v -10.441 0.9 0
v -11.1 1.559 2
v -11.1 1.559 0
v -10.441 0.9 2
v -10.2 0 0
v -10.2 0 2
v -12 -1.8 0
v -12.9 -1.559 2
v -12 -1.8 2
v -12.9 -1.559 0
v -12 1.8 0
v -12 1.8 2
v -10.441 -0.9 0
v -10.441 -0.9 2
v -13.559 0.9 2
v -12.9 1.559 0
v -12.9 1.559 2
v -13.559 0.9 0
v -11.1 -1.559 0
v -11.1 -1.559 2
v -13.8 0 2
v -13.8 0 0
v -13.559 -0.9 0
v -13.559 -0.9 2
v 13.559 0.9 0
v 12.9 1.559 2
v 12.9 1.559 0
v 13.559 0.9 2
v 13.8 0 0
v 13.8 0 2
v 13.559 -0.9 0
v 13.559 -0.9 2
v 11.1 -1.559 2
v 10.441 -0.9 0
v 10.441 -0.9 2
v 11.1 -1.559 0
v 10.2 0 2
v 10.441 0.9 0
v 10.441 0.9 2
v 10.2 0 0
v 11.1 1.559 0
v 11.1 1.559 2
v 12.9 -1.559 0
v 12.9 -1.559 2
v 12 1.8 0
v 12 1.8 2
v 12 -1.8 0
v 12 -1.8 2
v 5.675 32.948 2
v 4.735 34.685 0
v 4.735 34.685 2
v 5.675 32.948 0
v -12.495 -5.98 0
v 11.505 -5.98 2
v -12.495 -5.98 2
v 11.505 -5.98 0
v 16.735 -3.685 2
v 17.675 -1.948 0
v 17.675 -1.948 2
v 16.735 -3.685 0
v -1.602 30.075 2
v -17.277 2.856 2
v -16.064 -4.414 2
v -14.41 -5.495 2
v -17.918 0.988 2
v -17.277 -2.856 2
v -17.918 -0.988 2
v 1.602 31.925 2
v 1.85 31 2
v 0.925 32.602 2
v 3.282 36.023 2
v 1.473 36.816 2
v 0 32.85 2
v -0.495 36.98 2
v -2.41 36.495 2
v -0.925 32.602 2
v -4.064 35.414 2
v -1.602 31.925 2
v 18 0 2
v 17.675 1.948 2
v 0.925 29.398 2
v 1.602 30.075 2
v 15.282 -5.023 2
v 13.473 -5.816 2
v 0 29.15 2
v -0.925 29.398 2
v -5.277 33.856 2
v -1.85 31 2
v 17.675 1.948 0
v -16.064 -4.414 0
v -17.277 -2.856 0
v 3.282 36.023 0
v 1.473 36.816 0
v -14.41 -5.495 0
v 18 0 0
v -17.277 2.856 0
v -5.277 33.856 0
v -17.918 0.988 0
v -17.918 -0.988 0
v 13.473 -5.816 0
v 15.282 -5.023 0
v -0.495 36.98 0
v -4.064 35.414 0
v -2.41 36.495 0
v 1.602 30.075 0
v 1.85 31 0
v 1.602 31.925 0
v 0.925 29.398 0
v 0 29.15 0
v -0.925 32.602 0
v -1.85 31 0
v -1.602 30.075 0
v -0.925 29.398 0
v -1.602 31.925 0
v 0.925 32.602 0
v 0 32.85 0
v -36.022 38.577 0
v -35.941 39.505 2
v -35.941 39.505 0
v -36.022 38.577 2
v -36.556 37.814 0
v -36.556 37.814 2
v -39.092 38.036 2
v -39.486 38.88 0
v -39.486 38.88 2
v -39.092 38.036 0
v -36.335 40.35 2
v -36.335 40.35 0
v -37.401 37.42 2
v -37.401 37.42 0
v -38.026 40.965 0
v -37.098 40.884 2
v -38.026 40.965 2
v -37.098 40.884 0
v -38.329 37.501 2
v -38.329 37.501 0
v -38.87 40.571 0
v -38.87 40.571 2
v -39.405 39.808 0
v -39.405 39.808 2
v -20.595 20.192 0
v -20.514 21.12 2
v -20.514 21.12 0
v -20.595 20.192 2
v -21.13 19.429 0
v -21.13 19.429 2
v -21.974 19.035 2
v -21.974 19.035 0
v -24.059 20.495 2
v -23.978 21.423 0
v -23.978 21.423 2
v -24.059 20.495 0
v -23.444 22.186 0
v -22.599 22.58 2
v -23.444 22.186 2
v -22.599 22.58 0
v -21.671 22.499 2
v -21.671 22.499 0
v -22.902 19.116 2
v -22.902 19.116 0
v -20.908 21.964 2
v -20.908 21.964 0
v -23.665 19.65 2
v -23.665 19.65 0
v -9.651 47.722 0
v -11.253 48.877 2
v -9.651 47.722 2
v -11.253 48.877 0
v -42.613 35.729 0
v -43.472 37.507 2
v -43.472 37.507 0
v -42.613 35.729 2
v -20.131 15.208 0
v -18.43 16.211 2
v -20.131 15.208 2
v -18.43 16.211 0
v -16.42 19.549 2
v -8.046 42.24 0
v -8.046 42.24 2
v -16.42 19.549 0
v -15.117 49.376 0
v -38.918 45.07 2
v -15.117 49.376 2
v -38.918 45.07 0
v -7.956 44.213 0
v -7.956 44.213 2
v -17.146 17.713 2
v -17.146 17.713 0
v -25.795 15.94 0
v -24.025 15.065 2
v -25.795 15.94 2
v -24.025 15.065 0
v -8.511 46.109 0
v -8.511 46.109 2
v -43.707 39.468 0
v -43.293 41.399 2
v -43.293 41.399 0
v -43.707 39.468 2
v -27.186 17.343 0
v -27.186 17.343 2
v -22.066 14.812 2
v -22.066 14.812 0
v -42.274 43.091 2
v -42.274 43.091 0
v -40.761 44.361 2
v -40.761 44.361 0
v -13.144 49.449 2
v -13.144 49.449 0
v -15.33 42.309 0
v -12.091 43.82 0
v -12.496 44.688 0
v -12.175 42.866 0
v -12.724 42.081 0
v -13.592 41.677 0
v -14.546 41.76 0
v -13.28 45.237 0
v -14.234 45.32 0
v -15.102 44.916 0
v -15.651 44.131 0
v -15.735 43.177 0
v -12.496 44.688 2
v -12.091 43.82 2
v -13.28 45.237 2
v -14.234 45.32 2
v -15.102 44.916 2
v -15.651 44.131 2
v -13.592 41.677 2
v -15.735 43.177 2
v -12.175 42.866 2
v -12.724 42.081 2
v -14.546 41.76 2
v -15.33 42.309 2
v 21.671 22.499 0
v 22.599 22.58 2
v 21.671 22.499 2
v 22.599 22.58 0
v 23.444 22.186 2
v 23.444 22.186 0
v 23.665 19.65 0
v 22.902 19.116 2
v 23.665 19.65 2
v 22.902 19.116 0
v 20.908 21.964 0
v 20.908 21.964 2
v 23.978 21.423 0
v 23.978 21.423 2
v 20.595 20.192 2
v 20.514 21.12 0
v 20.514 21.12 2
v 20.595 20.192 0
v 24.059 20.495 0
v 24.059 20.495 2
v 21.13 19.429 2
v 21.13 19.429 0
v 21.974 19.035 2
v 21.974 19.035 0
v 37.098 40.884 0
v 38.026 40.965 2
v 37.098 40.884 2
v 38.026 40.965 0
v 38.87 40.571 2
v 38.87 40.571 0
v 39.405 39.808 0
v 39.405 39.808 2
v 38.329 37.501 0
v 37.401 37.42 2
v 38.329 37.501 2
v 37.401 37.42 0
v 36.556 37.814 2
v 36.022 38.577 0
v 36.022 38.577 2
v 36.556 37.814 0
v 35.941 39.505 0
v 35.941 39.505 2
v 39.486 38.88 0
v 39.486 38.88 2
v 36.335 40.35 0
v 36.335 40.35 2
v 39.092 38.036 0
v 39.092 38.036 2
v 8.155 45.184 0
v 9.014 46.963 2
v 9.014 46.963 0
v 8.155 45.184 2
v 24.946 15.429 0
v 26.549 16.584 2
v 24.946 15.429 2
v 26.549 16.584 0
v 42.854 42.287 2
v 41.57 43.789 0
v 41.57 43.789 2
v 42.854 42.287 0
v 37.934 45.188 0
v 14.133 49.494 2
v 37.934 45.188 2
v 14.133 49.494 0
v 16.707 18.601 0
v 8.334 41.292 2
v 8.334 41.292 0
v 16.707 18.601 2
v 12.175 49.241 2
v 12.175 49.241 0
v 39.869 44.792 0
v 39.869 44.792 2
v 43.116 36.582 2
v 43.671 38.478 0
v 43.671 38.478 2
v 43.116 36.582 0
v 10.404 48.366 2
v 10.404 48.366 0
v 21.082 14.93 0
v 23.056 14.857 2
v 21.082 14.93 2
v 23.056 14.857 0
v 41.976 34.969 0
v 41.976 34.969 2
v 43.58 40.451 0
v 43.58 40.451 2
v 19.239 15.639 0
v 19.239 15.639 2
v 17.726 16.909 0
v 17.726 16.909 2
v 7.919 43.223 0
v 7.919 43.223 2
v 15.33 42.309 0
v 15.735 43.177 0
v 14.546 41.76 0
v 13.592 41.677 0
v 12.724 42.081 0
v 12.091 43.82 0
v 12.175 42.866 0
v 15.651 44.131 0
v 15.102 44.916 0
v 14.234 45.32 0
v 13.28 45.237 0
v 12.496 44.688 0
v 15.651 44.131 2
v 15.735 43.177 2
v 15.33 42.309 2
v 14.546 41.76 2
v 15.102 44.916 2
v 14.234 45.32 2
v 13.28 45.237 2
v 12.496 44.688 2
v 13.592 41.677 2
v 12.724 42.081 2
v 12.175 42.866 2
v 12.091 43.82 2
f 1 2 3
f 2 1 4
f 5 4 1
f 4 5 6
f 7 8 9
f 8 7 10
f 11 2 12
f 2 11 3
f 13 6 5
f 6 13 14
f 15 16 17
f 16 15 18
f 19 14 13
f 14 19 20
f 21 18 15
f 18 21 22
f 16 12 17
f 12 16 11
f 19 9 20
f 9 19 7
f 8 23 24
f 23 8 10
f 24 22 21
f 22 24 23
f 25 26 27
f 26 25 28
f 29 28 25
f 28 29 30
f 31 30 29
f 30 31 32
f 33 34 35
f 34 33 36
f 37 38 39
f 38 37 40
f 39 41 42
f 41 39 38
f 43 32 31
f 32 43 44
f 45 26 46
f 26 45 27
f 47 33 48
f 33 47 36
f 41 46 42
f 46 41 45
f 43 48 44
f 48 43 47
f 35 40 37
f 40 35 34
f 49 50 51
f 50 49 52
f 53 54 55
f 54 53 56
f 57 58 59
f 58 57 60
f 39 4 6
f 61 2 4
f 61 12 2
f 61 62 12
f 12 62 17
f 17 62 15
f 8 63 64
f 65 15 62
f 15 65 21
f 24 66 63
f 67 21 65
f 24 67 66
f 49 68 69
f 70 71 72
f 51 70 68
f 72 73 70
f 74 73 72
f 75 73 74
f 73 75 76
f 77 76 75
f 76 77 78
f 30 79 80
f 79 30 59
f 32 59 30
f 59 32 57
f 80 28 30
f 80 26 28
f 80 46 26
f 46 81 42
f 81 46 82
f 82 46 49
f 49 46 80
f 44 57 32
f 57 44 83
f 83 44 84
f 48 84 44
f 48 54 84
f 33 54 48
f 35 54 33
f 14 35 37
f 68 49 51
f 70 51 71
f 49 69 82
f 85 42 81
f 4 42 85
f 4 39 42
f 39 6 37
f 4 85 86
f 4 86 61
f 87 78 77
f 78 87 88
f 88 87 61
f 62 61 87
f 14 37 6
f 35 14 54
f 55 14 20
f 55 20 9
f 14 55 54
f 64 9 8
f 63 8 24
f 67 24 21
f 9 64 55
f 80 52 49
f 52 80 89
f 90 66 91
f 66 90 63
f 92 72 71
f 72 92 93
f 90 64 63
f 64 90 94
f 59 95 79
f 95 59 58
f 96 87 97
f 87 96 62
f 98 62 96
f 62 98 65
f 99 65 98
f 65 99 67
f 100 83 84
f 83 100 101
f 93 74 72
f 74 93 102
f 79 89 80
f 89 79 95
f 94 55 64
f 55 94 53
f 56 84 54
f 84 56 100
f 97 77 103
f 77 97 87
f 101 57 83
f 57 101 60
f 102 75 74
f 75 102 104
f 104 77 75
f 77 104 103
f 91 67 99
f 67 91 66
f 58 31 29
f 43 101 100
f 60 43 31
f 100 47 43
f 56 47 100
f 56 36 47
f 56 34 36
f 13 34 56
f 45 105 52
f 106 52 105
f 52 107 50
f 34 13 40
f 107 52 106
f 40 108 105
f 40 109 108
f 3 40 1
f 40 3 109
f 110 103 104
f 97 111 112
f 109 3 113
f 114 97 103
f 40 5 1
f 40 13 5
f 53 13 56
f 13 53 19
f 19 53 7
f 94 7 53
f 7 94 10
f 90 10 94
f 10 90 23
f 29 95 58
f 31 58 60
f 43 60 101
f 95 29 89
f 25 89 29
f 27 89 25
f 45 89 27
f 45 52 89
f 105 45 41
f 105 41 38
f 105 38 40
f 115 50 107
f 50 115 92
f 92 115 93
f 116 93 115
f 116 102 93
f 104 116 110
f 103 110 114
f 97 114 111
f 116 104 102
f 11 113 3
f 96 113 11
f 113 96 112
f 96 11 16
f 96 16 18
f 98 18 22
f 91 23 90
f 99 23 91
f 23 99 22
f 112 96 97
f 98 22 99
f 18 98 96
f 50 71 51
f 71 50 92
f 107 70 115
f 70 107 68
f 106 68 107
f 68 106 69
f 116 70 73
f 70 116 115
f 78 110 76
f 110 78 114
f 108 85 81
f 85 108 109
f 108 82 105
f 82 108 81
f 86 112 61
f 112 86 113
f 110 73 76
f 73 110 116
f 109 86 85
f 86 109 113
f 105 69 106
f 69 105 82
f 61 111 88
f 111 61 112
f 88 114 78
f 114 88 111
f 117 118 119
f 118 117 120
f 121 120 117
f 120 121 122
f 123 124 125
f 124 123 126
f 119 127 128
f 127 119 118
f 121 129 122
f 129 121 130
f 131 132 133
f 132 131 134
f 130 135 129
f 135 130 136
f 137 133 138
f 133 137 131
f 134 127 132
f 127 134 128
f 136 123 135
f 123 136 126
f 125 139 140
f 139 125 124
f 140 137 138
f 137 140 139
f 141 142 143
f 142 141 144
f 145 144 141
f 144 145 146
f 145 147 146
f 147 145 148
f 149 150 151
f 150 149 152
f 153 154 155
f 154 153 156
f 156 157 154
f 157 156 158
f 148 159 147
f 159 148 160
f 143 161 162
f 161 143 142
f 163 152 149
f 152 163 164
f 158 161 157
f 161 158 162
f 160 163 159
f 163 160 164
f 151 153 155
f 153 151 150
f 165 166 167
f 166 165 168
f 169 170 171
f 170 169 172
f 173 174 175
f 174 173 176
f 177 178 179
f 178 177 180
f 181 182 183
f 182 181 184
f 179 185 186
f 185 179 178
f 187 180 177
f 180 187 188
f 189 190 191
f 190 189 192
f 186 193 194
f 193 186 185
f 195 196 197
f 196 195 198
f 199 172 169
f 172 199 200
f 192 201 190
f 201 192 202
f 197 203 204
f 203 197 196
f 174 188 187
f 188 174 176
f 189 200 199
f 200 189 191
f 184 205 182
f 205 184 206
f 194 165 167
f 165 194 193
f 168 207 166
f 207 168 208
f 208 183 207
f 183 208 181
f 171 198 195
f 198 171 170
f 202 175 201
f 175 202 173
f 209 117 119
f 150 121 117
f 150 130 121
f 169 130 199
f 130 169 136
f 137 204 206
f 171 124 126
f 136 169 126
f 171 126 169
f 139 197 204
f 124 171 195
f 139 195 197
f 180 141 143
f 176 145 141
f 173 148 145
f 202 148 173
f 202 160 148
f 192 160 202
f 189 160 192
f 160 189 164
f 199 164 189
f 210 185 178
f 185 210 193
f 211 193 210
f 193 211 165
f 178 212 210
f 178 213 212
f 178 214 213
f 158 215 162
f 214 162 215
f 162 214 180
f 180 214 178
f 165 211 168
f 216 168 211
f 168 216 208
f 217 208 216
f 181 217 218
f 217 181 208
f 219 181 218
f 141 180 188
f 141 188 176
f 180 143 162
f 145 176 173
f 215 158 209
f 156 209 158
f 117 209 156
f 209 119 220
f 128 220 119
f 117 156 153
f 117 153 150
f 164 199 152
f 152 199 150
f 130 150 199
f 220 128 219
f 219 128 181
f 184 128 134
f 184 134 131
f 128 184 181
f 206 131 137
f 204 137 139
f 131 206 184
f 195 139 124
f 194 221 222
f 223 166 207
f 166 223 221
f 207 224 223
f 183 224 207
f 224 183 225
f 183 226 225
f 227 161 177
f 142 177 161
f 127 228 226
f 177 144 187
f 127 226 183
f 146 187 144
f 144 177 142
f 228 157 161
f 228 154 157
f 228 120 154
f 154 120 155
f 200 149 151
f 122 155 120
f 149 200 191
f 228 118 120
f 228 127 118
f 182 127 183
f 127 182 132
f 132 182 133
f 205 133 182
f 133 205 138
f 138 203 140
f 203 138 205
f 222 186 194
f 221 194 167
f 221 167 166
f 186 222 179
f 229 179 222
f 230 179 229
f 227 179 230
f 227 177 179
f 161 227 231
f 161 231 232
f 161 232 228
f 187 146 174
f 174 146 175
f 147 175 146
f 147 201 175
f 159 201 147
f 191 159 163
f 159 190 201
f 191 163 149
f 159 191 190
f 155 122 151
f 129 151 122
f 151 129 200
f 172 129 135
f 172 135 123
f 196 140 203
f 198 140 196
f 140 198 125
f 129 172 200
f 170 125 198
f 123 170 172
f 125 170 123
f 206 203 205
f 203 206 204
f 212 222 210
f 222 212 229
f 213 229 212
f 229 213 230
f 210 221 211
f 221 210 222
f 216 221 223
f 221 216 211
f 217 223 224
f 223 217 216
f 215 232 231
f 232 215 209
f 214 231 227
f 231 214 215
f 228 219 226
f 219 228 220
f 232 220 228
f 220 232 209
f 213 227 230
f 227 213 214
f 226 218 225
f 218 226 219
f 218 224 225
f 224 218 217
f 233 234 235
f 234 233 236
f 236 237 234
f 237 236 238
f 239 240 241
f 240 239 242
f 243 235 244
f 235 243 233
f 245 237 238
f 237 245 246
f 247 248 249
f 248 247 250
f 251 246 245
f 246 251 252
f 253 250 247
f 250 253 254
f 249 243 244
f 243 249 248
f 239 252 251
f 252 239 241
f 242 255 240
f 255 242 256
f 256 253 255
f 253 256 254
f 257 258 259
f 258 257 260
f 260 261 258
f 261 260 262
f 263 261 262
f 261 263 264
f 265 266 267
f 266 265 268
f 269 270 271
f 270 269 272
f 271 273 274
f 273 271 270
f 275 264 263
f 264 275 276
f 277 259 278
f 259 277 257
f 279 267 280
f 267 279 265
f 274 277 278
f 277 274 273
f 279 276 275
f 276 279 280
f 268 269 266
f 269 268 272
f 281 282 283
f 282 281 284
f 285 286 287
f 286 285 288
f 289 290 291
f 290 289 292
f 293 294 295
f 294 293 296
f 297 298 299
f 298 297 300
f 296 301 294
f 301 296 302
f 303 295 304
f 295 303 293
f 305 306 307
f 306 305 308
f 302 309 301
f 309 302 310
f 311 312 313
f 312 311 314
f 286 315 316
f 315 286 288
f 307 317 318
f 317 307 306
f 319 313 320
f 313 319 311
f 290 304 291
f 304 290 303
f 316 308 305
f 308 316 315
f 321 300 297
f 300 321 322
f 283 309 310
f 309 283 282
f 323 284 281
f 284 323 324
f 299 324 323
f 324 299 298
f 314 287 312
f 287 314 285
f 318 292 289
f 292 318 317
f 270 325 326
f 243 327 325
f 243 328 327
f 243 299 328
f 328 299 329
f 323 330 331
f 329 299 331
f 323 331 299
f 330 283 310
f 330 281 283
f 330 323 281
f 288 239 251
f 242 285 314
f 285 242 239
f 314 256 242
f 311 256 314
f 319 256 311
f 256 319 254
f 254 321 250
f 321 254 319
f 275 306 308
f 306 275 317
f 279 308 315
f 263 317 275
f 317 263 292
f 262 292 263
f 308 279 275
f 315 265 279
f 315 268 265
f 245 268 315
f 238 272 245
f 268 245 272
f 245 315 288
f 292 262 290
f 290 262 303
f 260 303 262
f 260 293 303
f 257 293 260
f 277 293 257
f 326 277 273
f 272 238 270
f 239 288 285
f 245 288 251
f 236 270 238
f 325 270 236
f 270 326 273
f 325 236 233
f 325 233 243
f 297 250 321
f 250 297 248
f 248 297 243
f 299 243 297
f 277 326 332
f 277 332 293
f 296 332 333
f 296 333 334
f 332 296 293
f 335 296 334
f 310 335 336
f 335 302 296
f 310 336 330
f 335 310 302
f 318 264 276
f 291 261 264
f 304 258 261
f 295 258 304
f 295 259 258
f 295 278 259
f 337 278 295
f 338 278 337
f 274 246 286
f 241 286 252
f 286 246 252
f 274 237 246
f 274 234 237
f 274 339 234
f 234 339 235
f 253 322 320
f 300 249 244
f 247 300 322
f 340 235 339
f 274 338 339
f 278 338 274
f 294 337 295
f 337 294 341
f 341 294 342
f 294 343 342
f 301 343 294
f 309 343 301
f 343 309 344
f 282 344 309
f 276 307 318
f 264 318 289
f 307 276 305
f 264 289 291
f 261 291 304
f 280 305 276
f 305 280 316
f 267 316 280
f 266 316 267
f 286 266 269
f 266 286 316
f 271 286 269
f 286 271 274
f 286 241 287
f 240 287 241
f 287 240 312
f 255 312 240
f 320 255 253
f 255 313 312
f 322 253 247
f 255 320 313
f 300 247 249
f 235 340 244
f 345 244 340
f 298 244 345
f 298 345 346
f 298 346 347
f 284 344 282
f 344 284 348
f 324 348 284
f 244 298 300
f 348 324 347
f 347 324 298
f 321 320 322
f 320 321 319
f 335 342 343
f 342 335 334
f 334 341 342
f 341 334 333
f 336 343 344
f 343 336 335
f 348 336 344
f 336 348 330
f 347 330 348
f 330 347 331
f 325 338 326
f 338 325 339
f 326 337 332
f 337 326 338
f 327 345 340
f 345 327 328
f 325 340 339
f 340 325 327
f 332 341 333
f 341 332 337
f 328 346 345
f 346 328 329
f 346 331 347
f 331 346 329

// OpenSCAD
// Small tabs to mount ATX power supply to 3030 rail with m3 screws.

thickness = 2.0;

mount(ofs=16.0);
for (i=[-1,1]) translate([i*30,30,0]) rotate([0,0,i*50]) mount(ofs=6.0);

module mount(ofs=6.0) {
    difference() {
        hull() {
            for (i=[-1,1]) translate([i*12,0,0]) cylinder(d=12, h=thickness, center=false);
            translate([0,30/2+ofs,0]) cylinder(d=12, h=thickness, center=false);        
        }
        for (i=[-1,1]) translate([i*12,0,-1]) cylinder(d=3.6, h=thickness+2, center=false, $fn=12);
        translate([0,30/2+ofs,-1]) cylinder(d=3.7, h=thickness+2, center=false, $fn=12);        
    }    
}
